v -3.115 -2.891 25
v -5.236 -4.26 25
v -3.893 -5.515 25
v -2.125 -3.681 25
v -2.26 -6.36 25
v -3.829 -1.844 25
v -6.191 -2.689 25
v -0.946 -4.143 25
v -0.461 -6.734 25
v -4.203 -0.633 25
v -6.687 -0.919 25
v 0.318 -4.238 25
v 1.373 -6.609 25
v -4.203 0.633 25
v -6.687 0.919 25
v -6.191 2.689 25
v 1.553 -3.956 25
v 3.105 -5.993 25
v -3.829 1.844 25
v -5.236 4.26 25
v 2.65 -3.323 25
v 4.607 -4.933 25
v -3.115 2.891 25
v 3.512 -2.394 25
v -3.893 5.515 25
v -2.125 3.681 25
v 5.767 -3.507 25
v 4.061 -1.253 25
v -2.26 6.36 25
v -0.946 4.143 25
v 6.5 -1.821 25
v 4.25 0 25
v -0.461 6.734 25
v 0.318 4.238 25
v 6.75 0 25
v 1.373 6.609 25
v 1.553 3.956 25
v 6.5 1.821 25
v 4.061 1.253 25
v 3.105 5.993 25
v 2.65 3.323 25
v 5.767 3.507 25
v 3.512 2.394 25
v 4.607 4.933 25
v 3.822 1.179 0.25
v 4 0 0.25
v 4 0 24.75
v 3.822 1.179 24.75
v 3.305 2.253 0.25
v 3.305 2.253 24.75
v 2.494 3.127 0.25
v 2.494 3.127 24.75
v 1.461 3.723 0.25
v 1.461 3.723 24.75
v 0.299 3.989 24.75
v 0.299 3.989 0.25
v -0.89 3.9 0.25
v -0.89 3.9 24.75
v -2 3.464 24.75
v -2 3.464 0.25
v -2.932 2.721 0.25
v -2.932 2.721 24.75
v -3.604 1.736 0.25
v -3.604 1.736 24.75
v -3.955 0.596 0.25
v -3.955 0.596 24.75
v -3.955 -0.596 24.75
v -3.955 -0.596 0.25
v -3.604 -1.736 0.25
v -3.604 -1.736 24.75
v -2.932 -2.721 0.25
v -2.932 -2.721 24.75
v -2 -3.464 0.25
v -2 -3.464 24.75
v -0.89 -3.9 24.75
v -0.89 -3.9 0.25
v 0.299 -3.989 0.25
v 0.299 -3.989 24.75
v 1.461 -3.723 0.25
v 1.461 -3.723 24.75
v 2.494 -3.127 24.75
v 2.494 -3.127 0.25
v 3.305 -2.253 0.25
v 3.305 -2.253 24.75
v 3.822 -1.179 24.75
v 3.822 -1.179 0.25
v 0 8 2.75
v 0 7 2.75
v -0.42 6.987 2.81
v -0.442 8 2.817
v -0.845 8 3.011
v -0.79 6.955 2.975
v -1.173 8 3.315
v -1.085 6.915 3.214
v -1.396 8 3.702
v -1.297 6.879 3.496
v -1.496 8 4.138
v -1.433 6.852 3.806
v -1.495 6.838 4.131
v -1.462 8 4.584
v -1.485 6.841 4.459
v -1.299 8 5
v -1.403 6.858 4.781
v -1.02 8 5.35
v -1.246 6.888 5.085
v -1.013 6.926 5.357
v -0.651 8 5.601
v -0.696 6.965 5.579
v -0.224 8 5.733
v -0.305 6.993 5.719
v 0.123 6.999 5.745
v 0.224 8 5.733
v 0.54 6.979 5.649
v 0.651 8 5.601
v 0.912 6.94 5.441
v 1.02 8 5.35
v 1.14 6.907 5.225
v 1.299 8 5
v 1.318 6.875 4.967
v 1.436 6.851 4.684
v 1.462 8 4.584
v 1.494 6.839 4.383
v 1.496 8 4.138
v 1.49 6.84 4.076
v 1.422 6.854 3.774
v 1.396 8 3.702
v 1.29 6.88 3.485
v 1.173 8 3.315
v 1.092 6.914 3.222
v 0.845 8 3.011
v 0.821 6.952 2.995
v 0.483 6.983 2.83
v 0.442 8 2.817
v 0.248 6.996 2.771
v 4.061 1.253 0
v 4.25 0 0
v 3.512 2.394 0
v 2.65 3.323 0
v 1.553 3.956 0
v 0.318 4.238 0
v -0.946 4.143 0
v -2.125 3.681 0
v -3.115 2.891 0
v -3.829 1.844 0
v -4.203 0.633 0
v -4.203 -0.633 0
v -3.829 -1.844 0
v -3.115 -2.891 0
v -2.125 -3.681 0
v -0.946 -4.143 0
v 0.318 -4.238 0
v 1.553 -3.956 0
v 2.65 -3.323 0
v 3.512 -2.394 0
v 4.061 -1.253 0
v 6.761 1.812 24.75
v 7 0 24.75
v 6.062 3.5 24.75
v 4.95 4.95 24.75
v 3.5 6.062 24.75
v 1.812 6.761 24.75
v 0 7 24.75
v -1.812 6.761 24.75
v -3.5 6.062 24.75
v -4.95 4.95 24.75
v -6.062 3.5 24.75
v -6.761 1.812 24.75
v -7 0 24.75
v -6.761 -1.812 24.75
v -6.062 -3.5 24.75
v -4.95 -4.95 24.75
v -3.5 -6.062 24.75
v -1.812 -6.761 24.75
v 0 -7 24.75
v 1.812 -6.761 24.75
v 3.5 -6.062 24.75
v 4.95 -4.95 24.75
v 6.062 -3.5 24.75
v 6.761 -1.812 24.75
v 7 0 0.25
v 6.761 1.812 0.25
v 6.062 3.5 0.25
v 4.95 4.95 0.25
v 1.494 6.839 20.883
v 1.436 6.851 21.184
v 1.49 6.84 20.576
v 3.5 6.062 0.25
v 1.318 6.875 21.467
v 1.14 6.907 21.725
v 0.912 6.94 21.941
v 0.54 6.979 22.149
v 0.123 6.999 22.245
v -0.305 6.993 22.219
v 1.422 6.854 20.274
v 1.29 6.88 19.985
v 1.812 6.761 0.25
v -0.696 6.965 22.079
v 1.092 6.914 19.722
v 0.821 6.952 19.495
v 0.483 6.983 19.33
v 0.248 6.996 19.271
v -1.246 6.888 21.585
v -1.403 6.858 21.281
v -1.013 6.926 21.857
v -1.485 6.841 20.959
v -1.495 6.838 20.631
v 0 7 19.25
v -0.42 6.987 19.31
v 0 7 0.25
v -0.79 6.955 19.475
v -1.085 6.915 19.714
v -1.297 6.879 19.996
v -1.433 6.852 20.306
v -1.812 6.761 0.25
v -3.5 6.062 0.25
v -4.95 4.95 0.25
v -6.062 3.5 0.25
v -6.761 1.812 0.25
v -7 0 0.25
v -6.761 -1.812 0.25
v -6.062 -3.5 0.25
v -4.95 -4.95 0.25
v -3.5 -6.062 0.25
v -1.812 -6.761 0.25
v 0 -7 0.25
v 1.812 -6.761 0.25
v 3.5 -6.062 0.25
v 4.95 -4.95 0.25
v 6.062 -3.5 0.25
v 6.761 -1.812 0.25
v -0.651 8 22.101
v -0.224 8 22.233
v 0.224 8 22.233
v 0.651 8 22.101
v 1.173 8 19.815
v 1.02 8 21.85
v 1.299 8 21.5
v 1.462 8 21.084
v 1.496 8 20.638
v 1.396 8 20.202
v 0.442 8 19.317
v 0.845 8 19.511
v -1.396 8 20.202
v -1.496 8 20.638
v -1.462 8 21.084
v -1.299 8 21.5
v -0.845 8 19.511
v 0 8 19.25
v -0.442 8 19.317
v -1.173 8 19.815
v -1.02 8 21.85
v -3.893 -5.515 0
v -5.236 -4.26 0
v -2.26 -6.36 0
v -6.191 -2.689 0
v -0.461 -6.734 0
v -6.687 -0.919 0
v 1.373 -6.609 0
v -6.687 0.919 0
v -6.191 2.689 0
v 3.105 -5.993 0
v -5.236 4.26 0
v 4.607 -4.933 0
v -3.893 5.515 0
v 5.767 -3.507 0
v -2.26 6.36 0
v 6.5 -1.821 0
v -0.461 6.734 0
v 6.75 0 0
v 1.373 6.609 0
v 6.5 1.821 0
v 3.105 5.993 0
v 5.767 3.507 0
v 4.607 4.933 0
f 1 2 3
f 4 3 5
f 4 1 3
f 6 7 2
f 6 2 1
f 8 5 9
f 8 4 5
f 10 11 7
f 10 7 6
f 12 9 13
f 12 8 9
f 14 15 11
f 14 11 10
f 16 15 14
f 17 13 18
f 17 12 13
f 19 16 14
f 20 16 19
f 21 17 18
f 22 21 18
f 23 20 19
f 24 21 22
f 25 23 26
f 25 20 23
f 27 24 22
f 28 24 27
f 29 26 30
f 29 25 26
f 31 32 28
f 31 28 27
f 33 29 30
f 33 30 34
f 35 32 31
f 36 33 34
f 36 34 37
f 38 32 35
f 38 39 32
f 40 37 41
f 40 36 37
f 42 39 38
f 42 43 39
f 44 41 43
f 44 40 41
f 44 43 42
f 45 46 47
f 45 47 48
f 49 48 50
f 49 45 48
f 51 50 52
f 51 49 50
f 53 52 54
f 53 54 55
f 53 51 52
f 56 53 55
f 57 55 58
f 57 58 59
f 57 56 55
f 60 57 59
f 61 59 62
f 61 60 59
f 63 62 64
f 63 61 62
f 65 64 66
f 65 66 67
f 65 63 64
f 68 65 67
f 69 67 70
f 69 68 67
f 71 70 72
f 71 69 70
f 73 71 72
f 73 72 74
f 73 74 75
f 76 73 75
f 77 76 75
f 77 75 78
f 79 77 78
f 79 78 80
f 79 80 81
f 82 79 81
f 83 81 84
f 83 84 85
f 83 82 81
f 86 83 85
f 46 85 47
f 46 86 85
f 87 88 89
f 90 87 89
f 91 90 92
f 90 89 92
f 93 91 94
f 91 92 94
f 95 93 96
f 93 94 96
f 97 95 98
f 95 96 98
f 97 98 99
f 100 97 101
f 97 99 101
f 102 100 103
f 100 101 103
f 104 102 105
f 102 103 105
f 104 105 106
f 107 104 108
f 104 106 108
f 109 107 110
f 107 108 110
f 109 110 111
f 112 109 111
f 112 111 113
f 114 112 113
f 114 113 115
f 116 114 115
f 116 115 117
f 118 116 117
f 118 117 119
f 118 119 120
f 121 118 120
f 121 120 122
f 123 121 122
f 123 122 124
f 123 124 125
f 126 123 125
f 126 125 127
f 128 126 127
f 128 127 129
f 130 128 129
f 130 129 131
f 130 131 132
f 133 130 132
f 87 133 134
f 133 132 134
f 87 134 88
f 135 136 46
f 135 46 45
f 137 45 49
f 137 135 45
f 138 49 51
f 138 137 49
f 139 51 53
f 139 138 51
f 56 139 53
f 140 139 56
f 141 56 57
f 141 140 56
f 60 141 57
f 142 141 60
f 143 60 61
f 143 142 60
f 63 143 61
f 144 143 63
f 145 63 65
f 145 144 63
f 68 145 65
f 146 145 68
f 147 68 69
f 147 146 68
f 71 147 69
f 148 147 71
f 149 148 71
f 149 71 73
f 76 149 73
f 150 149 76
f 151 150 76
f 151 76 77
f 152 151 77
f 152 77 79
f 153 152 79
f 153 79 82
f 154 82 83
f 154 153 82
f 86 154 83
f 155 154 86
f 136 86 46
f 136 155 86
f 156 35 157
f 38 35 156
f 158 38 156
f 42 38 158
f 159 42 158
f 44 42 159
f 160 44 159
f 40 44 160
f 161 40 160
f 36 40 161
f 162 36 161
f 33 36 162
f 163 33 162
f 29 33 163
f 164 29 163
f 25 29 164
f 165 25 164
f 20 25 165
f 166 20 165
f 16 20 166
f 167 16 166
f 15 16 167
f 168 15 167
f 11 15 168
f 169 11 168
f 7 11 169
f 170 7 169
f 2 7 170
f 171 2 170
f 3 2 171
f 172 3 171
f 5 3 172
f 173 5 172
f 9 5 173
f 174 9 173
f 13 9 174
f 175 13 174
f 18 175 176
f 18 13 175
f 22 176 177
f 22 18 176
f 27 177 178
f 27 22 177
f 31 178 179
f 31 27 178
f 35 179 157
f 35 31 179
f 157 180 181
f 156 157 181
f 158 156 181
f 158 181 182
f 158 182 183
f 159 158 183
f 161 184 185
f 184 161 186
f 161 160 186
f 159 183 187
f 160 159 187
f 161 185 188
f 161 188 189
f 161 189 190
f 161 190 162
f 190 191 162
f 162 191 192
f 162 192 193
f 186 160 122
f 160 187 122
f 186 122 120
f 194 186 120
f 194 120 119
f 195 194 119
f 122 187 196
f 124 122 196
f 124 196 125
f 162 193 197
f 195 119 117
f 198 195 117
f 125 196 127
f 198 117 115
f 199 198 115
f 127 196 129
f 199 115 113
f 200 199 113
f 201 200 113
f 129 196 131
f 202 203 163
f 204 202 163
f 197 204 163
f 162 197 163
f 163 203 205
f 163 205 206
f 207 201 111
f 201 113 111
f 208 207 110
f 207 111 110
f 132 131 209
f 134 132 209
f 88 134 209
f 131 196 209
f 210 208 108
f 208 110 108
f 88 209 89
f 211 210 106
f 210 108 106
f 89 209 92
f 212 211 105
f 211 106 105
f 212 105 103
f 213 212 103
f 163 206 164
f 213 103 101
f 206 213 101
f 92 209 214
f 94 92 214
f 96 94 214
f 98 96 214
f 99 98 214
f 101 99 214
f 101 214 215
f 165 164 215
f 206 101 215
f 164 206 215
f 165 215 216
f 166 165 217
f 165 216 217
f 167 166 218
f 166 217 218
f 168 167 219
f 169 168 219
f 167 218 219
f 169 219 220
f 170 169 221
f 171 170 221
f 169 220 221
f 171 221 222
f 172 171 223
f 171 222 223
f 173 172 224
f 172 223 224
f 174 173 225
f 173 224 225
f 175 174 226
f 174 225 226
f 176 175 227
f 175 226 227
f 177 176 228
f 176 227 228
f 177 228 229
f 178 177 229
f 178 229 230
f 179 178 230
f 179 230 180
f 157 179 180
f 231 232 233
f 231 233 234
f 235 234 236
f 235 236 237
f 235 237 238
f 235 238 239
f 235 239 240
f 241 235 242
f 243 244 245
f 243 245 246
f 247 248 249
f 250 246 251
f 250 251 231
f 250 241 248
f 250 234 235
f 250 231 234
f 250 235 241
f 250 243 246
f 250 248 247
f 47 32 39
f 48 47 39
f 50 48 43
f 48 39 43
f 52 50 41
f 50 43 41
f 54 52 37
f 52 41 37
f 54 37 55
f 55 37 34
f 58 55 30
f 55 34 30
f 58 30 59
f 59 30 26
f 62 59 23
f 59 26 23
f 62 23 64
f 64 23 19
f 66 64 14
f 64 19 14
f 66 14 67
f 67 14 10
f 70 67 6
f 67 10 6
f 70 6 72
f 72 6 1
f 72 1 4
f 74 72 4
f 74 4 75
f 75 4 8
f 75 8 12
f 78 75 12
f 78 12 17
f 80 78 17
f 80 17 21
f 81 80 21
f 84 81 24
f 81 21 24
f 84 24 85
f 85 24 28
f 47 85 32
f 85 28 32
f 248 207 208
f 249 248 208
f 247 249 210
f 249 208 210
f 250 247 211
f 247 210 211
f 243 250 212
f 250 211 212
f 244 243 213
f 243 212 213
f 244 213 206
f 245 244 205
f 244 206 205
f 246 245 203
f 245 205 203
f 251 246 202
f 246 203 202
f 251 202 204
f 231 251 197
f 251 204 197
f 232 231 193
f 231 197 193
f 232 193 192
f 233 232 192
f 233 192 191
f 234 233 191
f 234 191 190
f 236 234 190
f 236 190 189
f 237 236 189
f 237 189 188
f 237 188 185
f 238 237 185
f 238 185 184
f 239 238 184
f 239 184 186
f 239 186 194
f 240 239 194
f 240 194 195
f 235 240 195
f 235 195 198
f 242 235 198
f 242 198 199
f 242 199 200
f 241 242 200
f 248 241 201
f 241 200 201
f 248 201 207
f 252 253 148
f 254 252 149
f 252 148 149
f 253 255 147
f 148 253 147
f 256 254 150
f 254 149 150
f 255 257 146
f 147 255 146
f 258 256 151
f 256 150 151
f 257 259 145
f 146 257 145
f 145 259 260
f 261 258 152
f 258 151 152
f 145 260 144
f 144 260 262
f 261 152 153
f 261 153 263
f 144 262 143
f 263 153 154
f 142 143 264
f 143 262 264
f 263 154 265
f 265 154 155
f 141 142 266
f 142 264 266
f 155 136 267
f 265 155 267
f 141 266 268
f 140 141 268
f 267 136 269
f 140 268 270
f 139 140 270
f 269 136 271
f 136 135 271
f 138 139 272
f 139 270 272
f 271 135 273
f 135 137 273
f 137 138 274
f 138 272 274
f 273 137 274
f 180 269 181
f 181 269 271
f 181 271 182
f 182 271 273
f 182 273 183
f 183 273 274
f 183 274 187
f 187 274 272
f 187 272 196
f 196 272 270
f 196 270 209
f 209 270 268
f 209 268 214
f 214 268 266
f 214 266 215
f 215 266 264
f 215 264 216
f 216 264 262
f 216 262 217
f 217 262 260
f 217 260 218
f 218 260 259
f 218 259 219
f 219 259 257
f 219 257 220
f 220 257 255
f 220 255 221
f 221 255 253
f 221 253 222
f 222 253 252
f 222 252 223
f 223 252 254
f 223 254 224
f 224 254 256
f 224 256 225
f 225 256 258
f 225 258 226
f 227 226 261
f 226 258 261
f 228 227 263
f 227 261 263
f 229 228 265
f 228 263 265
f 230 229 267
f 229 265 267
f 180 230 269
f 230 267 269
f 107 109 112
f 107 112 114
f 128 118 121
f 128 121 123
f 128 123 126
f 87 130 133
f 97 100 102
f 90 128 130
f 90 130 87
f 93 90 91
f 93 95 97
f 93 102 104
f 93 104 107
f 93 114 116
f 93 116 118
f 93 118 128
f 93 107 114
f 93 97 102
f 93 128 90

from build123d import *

# Parameters (mm, degrees)
ESQUISSE1_R        = 7
ESQUISSE1_R_2      = 4
BOSS_EXTRU_1_DEPTH = 25
CHANFREIN1_SIZE    = 0.25
BOSS_EXTRU_2_START = 5
ESQUISSE2_R        = 1.5
BOSS_EXTRU_2_DEPTH = 3


with BuildPart() as part:
    # Esquisse1 → Boss.-Extru.1 (new body)
    with BuildSketch(Plane.XY):
        Circle(ESQUISSE1_R)
        Circle(ESQUISSE1_R_2, mode=Mode.SUBTRACT)
    extrude(amount=BOSS_EXTRU_1_DEPTH)

    # Chanfrein1
    chanfrein1_edges = [part.edges().sort_by_distance(p)[0] for p in [
        (-7, 0, 0),
        (-7, 0, 25),
        (-4, 0, 0),
        (-4, 0, 25),
    ]]
    chamfer(chanfrein1_edges, length=CHANFREIN1_SIZE)

    # Esquisse2 → Boss.-Extru.2 (add)
    with BuildSketch(Plane(origin=(0, 0, 0), x_dir=(1, 0, 0), z_dir=(0, 1, 0)).offset(BOSS_EXTRU_2_START)):
        with Locations(Location((0, -4.25, 0), (0, 0, 90))):
            Circle(ESQUISSE2_R)
        with Locations(Location((0, -20.75, 0), (0, 0, 90))):
            Circle(ESQUISSE2_R)
    extrude(amount=BOSS_EXTRU_2_DEPTH)


solid = part.part
